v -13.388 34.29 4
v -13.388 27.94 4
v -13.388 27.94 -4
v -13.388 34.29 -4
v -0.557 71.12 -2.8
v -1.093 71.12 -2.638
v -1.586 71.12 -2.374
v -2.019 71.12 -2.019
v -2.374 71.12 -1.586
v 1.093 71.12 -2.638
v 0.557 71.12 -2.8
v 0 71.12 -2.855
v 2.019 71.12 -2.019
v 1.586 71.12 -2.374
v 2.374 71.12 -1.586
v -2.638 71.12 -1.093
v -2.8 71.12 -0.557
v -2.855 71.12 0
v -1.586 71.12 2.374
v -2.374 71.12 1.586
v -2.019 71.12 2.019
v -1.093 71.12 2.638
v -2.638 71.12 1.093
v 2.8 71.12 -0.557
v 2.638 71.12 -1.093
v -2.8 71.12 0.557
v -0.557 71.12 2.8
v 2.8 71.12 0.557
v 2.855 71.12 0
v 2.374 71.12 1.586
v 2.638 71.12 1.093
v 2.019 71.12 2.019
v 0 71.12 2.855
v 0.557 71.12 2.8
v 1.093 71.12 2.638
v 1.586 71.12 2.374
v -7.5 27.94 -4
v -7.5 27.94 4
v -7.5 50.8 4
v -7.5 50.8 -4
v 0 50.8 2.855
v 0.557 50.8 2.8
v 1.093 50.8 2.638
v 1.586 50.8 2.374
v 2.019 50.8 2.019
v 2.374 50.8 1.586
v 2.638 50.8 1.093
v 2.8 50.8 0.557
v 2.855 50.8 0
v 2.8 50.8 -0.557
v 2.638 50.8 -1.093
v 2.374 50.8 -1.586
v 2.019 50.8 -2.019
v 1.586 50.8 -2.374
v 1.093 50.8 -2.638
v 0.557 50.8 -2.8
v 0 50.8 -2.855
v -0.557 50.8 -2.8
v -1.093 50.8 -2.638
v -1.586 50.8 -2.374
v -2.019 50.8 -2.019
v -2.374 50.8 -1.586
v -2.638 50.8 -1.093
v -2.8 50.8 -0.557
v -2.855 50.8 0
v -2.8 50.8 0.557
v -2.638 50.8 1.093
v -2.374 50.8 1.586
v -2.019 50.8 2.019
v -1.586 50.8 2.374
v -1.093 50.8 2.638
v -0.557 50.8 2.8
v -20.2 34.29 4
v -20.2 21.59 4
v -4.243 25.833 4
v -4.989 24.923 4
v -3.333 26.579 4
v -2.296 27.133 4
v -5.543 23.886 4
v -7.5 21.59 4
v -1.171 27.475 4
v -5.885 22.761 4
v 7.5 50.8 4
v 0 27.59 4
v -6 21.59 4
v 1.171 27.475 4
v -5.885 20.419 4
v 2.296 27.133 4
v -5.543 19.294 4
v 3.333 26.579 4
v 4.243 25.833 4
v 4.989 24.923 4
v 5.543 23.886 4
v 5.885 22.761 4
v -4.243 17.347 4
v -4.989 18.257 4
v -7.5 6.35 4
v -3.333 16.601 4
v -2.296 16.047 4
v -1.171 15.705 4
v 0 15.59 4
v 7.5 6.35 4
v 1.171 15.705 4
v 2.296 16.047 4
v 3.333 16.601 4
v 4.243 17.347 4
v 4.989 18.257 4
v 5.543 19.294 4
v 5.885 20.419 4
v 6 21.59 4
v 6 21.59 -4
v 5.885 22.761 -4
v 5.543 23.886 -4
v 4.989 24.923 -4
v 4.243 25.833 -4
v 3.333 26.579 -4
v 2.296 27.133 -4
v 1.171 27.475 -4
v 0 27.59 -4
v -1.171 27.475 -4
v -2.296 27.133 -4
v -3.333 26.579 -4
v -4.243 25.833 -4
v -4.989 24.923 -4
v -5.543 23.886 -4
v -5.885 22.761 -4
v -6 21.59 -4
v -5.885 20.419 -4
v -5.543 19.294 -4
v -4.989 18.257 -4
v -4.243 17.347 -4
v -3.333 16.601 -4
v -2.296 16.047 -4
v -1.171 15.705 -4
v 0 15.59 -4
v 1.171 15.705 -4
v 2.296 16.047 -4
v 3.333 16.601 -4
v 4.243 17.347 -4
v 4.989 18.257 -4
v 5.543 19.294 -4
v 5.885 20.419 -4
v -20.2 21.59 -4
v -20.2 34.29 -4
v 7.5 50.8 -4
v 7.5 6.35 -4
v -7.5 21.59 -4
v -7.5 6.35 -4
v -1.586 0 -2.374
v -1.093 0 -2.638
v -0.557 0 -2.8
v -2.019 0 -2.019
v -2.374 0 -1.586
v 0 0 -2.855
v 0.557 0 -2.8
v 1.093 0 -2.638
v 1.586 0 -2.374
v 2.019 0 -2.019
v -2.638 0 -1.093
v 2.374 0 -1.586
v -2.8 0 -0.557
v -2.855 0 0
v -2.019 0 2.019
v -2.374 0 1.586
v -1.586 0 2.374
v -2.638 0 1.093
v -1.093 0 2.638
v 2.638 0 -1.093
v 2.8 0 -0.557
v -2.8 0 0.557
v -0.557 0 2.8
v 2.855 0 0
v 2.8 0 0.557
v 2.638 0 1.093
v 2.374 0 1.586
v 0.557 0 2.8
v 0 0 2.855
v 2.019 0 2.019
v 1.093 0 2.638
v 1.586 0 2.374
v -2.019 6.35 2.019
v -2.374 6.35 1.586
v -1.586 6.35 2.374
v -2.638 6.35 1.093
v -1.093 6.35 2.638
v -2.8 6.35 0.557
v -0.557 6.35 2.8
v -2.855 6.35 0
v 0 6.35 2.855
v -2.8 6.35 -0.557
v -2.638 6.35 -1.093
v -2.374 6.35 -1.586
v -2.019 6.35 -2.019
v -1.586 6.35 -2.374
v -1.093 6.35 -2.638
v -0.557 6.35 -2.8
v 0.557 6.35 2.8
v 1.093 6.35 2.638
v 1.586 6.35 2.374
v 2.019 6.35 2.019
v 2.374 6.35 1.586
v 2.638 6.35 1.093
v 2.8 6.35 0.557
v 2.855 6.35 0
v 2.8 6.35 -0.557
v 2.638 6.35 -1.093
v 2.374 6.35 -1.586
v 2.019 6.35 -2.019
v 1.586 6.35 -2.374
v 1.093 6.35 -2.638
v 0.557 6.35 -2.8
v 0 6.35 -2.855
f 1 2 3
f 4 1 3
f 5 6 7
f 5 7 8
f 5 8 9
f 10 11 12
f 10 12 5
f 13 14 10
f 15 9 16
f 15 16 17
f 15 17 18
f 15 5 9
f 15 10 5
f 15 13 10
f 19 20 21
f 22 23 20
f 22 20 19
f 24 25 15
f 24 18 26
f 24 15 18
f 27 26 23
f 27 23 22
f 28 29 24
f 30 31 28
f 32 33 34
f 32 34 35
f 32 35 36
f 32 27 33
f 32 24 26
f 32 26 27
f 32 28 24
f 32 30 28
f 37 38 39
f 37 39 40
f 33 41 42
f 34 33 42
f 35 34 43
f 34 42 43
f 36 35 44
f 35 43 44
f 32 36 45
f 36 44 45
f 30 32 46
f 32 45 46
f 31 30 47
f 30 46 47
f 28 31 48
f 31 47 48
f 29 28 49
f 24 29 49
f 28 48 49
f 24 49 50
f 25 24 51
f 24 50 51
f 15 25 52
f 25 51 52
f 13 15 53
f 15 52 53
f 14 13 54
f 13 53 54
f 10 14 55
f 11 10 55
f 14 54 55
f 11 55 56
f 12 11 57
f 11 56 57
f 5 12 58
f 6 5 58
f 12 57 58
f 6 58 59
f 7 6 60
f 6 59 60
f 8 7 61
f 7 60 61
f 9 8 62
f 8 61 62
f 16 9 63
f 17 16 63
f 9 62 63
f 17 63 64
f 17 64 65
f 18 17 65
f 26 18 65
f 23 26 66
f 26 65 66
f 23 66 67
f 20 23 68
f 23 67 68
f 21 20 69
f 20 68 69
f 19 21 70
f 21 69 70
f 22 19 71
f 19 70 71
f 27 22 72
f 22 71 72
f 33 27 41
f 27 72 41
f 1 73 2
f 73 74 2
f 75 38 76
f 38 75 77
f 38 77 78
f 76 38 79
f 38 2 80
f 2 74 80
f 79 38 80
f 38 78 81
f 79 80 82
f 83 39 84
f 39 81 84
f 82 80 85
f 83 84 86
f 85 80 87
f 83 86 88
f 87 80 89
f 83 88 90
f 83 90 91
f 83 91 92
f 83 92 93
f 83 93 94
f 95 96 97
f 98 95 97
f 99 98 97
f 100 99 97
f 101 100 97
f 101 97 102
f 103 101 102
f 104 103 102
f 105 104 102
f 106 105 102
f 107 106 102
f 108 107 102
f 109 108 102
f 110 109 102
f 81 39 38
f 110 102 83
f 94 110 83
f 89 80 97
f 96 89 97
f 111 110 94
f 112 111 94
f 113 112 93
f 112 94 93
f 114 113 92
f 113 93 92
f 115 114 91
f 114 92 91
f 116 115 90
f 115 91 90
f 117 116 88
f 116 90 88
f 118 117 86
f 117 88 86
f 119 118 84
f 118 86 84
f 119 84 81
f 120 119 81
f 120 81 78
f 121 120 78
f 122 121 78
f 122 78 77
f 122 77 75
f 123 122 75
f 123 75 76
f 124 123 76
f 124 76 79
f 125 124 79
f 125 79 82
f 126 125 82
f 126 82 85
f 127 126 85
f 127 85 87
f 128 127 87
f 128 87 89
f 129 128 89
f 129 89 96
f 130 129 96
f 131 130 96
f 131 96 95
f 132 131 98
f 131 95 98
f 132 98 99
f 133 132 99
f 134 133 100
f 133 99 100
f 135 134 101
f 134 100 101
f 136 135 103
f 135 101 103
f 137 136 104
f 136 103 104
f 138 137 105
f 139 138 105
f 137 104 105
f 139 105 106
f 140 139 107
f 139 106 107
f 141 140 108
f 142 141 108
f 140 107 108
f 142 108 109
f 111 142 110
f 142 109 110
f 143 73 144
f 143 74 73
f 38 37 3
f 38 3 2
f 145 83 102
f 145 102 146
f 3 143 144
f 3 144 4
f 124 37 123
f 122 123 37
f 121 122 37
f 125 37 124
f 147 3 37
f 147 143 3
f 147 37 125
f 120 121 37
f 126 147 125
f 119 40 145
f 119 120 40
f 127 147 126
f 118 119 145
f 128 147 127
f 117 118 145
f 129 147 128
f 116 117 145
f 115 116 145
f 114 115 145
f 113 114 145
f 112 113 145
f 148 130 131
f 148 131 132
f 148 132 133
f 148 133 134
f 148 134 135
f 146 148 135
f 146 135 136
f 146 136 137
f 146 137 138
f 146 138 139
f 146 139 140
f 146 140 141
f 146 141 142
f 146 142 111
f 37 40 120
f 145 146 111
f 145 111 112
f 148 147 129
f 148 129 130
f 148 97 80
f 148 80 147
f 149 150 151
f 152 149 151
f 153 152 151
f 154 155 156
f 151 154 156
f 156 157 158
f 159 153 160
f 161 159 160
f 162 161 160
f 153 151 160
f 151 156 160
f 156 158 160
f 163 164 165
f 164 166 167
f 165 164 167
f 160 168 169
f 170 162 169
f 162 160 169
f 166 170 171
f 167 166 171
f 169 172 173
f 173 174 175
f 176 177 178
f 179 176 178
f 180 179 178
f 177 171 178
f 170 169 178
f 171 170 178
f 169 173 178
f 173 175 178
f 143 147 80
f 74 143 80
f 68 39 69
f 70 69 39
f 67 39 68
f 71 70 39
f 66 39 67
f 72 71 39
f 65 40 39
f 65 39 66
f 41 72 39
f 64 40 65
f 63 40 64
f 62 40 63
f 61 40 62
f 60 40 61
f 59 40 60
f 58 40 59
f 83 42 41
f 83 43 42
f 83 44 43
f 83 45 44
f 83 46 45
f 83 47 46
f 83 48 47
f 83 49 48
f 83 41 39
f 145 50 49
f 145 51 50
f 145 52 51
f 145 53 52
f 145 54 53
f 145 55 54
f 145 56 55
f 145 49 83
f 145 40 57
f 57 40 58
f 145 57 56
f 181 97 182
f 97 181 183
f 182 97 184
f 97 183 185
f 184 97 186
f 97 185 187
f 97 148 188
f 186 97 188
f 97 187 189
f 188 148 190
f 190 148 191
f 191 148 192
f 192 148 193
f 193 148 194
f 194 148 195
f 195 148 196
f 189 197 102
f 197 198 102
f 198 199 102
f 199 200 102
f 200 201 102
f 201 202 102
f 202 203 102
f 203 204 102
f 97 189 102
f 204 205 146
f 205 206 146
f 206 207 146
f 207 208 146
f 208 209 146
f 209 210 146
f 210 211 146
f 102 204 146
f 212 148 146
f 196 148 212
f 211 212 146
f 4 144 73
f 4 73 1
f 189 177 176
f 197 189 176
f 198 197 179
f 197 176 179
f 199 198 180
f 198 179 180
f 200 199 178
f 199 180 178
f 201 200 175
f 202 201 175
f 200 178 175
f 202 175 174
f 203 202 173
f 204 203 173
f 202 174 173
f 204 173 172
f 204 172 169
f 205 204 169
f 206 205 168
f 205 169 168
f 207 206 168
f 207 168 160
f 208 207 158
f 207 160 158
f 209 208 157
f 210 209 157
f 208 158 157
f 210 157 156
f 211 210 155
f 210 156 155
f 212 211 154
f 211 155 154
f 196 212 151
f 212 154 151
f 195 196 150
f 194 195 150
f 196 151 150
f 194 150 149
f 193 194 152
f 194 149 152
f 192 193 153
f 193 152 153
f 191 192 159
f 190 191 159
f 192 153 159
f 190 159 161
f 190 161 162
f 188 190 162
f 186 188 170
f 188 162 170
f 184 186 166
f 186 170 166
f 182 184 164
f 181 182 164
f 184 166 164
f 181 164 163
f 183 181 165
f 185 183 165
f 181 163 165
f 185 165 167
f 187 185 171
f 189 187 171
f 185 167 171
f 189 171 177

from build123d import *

# Parameters (mm, degrees)
SKETCH1_R           = 2.855
BOSS_EXTRUDE1_DEPTH = 6.35
SKETCH2_W           = 15
SKETCH2_H           = 8
BOSS_EXTRUDE2_DEPTH = 44.45
SKETCH3_R           = 6
CUT_EXTRUDE1_DEPTH  = 25.4
SKETCH4_R           = 2.855
BOSS_EXTRUDE3_DEPTH = 20.32
SKETCH5_W           = 8
SKETCH5_H           = 6.35
BOSS_EXTRUDE4_DEPTH = 12.7
SKETCH6_W           = 6.812329396
SKETCH6_H           = 8
BOSS_EXTRUDE5_DEPTH = 6.35


with BuildPart() as part:
    # Sketch1 → Boss-Extrude1 (new body)
    with BuildSketch(Plane(origin=(0, 0, 0), x_dir=(1, 0, 0), z_dir=(0, 1, 0))):
        with Locations(Location((0, 0, 0), (0, 0, 270))):
            Circle(SKETCH1_R)
    extrude(amount=BOSS_EXTRUDE1_DEPTH)

    # Sketch2 → Boss-Extrude2 (add)
    with BuildSketch(Plane(origin=(0, 6.35, 0), x_dir=(1, 0, 0), z_dir=(0, 1, 0))):
        Rectangle(SKETCH2_W, SKETCH2_H)
    extrude(amount=BOSS_EXTRUDE2_DEPTH)

    # Sketch3 → Cut-Extrude1 (cut)
    with BuildSketch(Plane.XY.offset(4)):
        with Locations((0, 21.59)):
            Circle(SKETCH3_R)
    extrude(amount=-CUT_EXTRUDE1_DEPTH, mode=Mode.SUBTRACT)

    # Sketch4 → Boss-Extrude3 (add)
    with BuildSketch(Plane(origin=(0, 50.8, 0), x_dir=(1, 0, 0), z_dir=(0, 1, 0))):
        with Locations(Location((0, 0, 0), (0, 0, 270))):
            Circle(SKETCH4_R)
    extrude(amount=BOSS_EXTRUDE3_DEPTH)

    # Sketch5 → Boss-Extrude4 (add)
    with BuildSketch(Plane.ZY.offset(7.5)):
        with Locations((0, 24.765)):
            Rectangle(SKETCH5_W, SKETCH5_H)
    extrude(amount=BOSS_EXTRUDE4_DEPTH)

    # Sketch6 → Boss-Extrude5 (add)
    with BuildSketch(Plane(origin=(0, 27.94, 0), x_dir=(1, 0, 0), z_dir=(0, 1, 0))):
        with Locations((-16.793835302, 0)):
            Rectangle(SKETCH6_W, SKETCH6_H)
    extrude(amount=BOSS_EXTRUDE5_DEPTH)


solid = part.part
